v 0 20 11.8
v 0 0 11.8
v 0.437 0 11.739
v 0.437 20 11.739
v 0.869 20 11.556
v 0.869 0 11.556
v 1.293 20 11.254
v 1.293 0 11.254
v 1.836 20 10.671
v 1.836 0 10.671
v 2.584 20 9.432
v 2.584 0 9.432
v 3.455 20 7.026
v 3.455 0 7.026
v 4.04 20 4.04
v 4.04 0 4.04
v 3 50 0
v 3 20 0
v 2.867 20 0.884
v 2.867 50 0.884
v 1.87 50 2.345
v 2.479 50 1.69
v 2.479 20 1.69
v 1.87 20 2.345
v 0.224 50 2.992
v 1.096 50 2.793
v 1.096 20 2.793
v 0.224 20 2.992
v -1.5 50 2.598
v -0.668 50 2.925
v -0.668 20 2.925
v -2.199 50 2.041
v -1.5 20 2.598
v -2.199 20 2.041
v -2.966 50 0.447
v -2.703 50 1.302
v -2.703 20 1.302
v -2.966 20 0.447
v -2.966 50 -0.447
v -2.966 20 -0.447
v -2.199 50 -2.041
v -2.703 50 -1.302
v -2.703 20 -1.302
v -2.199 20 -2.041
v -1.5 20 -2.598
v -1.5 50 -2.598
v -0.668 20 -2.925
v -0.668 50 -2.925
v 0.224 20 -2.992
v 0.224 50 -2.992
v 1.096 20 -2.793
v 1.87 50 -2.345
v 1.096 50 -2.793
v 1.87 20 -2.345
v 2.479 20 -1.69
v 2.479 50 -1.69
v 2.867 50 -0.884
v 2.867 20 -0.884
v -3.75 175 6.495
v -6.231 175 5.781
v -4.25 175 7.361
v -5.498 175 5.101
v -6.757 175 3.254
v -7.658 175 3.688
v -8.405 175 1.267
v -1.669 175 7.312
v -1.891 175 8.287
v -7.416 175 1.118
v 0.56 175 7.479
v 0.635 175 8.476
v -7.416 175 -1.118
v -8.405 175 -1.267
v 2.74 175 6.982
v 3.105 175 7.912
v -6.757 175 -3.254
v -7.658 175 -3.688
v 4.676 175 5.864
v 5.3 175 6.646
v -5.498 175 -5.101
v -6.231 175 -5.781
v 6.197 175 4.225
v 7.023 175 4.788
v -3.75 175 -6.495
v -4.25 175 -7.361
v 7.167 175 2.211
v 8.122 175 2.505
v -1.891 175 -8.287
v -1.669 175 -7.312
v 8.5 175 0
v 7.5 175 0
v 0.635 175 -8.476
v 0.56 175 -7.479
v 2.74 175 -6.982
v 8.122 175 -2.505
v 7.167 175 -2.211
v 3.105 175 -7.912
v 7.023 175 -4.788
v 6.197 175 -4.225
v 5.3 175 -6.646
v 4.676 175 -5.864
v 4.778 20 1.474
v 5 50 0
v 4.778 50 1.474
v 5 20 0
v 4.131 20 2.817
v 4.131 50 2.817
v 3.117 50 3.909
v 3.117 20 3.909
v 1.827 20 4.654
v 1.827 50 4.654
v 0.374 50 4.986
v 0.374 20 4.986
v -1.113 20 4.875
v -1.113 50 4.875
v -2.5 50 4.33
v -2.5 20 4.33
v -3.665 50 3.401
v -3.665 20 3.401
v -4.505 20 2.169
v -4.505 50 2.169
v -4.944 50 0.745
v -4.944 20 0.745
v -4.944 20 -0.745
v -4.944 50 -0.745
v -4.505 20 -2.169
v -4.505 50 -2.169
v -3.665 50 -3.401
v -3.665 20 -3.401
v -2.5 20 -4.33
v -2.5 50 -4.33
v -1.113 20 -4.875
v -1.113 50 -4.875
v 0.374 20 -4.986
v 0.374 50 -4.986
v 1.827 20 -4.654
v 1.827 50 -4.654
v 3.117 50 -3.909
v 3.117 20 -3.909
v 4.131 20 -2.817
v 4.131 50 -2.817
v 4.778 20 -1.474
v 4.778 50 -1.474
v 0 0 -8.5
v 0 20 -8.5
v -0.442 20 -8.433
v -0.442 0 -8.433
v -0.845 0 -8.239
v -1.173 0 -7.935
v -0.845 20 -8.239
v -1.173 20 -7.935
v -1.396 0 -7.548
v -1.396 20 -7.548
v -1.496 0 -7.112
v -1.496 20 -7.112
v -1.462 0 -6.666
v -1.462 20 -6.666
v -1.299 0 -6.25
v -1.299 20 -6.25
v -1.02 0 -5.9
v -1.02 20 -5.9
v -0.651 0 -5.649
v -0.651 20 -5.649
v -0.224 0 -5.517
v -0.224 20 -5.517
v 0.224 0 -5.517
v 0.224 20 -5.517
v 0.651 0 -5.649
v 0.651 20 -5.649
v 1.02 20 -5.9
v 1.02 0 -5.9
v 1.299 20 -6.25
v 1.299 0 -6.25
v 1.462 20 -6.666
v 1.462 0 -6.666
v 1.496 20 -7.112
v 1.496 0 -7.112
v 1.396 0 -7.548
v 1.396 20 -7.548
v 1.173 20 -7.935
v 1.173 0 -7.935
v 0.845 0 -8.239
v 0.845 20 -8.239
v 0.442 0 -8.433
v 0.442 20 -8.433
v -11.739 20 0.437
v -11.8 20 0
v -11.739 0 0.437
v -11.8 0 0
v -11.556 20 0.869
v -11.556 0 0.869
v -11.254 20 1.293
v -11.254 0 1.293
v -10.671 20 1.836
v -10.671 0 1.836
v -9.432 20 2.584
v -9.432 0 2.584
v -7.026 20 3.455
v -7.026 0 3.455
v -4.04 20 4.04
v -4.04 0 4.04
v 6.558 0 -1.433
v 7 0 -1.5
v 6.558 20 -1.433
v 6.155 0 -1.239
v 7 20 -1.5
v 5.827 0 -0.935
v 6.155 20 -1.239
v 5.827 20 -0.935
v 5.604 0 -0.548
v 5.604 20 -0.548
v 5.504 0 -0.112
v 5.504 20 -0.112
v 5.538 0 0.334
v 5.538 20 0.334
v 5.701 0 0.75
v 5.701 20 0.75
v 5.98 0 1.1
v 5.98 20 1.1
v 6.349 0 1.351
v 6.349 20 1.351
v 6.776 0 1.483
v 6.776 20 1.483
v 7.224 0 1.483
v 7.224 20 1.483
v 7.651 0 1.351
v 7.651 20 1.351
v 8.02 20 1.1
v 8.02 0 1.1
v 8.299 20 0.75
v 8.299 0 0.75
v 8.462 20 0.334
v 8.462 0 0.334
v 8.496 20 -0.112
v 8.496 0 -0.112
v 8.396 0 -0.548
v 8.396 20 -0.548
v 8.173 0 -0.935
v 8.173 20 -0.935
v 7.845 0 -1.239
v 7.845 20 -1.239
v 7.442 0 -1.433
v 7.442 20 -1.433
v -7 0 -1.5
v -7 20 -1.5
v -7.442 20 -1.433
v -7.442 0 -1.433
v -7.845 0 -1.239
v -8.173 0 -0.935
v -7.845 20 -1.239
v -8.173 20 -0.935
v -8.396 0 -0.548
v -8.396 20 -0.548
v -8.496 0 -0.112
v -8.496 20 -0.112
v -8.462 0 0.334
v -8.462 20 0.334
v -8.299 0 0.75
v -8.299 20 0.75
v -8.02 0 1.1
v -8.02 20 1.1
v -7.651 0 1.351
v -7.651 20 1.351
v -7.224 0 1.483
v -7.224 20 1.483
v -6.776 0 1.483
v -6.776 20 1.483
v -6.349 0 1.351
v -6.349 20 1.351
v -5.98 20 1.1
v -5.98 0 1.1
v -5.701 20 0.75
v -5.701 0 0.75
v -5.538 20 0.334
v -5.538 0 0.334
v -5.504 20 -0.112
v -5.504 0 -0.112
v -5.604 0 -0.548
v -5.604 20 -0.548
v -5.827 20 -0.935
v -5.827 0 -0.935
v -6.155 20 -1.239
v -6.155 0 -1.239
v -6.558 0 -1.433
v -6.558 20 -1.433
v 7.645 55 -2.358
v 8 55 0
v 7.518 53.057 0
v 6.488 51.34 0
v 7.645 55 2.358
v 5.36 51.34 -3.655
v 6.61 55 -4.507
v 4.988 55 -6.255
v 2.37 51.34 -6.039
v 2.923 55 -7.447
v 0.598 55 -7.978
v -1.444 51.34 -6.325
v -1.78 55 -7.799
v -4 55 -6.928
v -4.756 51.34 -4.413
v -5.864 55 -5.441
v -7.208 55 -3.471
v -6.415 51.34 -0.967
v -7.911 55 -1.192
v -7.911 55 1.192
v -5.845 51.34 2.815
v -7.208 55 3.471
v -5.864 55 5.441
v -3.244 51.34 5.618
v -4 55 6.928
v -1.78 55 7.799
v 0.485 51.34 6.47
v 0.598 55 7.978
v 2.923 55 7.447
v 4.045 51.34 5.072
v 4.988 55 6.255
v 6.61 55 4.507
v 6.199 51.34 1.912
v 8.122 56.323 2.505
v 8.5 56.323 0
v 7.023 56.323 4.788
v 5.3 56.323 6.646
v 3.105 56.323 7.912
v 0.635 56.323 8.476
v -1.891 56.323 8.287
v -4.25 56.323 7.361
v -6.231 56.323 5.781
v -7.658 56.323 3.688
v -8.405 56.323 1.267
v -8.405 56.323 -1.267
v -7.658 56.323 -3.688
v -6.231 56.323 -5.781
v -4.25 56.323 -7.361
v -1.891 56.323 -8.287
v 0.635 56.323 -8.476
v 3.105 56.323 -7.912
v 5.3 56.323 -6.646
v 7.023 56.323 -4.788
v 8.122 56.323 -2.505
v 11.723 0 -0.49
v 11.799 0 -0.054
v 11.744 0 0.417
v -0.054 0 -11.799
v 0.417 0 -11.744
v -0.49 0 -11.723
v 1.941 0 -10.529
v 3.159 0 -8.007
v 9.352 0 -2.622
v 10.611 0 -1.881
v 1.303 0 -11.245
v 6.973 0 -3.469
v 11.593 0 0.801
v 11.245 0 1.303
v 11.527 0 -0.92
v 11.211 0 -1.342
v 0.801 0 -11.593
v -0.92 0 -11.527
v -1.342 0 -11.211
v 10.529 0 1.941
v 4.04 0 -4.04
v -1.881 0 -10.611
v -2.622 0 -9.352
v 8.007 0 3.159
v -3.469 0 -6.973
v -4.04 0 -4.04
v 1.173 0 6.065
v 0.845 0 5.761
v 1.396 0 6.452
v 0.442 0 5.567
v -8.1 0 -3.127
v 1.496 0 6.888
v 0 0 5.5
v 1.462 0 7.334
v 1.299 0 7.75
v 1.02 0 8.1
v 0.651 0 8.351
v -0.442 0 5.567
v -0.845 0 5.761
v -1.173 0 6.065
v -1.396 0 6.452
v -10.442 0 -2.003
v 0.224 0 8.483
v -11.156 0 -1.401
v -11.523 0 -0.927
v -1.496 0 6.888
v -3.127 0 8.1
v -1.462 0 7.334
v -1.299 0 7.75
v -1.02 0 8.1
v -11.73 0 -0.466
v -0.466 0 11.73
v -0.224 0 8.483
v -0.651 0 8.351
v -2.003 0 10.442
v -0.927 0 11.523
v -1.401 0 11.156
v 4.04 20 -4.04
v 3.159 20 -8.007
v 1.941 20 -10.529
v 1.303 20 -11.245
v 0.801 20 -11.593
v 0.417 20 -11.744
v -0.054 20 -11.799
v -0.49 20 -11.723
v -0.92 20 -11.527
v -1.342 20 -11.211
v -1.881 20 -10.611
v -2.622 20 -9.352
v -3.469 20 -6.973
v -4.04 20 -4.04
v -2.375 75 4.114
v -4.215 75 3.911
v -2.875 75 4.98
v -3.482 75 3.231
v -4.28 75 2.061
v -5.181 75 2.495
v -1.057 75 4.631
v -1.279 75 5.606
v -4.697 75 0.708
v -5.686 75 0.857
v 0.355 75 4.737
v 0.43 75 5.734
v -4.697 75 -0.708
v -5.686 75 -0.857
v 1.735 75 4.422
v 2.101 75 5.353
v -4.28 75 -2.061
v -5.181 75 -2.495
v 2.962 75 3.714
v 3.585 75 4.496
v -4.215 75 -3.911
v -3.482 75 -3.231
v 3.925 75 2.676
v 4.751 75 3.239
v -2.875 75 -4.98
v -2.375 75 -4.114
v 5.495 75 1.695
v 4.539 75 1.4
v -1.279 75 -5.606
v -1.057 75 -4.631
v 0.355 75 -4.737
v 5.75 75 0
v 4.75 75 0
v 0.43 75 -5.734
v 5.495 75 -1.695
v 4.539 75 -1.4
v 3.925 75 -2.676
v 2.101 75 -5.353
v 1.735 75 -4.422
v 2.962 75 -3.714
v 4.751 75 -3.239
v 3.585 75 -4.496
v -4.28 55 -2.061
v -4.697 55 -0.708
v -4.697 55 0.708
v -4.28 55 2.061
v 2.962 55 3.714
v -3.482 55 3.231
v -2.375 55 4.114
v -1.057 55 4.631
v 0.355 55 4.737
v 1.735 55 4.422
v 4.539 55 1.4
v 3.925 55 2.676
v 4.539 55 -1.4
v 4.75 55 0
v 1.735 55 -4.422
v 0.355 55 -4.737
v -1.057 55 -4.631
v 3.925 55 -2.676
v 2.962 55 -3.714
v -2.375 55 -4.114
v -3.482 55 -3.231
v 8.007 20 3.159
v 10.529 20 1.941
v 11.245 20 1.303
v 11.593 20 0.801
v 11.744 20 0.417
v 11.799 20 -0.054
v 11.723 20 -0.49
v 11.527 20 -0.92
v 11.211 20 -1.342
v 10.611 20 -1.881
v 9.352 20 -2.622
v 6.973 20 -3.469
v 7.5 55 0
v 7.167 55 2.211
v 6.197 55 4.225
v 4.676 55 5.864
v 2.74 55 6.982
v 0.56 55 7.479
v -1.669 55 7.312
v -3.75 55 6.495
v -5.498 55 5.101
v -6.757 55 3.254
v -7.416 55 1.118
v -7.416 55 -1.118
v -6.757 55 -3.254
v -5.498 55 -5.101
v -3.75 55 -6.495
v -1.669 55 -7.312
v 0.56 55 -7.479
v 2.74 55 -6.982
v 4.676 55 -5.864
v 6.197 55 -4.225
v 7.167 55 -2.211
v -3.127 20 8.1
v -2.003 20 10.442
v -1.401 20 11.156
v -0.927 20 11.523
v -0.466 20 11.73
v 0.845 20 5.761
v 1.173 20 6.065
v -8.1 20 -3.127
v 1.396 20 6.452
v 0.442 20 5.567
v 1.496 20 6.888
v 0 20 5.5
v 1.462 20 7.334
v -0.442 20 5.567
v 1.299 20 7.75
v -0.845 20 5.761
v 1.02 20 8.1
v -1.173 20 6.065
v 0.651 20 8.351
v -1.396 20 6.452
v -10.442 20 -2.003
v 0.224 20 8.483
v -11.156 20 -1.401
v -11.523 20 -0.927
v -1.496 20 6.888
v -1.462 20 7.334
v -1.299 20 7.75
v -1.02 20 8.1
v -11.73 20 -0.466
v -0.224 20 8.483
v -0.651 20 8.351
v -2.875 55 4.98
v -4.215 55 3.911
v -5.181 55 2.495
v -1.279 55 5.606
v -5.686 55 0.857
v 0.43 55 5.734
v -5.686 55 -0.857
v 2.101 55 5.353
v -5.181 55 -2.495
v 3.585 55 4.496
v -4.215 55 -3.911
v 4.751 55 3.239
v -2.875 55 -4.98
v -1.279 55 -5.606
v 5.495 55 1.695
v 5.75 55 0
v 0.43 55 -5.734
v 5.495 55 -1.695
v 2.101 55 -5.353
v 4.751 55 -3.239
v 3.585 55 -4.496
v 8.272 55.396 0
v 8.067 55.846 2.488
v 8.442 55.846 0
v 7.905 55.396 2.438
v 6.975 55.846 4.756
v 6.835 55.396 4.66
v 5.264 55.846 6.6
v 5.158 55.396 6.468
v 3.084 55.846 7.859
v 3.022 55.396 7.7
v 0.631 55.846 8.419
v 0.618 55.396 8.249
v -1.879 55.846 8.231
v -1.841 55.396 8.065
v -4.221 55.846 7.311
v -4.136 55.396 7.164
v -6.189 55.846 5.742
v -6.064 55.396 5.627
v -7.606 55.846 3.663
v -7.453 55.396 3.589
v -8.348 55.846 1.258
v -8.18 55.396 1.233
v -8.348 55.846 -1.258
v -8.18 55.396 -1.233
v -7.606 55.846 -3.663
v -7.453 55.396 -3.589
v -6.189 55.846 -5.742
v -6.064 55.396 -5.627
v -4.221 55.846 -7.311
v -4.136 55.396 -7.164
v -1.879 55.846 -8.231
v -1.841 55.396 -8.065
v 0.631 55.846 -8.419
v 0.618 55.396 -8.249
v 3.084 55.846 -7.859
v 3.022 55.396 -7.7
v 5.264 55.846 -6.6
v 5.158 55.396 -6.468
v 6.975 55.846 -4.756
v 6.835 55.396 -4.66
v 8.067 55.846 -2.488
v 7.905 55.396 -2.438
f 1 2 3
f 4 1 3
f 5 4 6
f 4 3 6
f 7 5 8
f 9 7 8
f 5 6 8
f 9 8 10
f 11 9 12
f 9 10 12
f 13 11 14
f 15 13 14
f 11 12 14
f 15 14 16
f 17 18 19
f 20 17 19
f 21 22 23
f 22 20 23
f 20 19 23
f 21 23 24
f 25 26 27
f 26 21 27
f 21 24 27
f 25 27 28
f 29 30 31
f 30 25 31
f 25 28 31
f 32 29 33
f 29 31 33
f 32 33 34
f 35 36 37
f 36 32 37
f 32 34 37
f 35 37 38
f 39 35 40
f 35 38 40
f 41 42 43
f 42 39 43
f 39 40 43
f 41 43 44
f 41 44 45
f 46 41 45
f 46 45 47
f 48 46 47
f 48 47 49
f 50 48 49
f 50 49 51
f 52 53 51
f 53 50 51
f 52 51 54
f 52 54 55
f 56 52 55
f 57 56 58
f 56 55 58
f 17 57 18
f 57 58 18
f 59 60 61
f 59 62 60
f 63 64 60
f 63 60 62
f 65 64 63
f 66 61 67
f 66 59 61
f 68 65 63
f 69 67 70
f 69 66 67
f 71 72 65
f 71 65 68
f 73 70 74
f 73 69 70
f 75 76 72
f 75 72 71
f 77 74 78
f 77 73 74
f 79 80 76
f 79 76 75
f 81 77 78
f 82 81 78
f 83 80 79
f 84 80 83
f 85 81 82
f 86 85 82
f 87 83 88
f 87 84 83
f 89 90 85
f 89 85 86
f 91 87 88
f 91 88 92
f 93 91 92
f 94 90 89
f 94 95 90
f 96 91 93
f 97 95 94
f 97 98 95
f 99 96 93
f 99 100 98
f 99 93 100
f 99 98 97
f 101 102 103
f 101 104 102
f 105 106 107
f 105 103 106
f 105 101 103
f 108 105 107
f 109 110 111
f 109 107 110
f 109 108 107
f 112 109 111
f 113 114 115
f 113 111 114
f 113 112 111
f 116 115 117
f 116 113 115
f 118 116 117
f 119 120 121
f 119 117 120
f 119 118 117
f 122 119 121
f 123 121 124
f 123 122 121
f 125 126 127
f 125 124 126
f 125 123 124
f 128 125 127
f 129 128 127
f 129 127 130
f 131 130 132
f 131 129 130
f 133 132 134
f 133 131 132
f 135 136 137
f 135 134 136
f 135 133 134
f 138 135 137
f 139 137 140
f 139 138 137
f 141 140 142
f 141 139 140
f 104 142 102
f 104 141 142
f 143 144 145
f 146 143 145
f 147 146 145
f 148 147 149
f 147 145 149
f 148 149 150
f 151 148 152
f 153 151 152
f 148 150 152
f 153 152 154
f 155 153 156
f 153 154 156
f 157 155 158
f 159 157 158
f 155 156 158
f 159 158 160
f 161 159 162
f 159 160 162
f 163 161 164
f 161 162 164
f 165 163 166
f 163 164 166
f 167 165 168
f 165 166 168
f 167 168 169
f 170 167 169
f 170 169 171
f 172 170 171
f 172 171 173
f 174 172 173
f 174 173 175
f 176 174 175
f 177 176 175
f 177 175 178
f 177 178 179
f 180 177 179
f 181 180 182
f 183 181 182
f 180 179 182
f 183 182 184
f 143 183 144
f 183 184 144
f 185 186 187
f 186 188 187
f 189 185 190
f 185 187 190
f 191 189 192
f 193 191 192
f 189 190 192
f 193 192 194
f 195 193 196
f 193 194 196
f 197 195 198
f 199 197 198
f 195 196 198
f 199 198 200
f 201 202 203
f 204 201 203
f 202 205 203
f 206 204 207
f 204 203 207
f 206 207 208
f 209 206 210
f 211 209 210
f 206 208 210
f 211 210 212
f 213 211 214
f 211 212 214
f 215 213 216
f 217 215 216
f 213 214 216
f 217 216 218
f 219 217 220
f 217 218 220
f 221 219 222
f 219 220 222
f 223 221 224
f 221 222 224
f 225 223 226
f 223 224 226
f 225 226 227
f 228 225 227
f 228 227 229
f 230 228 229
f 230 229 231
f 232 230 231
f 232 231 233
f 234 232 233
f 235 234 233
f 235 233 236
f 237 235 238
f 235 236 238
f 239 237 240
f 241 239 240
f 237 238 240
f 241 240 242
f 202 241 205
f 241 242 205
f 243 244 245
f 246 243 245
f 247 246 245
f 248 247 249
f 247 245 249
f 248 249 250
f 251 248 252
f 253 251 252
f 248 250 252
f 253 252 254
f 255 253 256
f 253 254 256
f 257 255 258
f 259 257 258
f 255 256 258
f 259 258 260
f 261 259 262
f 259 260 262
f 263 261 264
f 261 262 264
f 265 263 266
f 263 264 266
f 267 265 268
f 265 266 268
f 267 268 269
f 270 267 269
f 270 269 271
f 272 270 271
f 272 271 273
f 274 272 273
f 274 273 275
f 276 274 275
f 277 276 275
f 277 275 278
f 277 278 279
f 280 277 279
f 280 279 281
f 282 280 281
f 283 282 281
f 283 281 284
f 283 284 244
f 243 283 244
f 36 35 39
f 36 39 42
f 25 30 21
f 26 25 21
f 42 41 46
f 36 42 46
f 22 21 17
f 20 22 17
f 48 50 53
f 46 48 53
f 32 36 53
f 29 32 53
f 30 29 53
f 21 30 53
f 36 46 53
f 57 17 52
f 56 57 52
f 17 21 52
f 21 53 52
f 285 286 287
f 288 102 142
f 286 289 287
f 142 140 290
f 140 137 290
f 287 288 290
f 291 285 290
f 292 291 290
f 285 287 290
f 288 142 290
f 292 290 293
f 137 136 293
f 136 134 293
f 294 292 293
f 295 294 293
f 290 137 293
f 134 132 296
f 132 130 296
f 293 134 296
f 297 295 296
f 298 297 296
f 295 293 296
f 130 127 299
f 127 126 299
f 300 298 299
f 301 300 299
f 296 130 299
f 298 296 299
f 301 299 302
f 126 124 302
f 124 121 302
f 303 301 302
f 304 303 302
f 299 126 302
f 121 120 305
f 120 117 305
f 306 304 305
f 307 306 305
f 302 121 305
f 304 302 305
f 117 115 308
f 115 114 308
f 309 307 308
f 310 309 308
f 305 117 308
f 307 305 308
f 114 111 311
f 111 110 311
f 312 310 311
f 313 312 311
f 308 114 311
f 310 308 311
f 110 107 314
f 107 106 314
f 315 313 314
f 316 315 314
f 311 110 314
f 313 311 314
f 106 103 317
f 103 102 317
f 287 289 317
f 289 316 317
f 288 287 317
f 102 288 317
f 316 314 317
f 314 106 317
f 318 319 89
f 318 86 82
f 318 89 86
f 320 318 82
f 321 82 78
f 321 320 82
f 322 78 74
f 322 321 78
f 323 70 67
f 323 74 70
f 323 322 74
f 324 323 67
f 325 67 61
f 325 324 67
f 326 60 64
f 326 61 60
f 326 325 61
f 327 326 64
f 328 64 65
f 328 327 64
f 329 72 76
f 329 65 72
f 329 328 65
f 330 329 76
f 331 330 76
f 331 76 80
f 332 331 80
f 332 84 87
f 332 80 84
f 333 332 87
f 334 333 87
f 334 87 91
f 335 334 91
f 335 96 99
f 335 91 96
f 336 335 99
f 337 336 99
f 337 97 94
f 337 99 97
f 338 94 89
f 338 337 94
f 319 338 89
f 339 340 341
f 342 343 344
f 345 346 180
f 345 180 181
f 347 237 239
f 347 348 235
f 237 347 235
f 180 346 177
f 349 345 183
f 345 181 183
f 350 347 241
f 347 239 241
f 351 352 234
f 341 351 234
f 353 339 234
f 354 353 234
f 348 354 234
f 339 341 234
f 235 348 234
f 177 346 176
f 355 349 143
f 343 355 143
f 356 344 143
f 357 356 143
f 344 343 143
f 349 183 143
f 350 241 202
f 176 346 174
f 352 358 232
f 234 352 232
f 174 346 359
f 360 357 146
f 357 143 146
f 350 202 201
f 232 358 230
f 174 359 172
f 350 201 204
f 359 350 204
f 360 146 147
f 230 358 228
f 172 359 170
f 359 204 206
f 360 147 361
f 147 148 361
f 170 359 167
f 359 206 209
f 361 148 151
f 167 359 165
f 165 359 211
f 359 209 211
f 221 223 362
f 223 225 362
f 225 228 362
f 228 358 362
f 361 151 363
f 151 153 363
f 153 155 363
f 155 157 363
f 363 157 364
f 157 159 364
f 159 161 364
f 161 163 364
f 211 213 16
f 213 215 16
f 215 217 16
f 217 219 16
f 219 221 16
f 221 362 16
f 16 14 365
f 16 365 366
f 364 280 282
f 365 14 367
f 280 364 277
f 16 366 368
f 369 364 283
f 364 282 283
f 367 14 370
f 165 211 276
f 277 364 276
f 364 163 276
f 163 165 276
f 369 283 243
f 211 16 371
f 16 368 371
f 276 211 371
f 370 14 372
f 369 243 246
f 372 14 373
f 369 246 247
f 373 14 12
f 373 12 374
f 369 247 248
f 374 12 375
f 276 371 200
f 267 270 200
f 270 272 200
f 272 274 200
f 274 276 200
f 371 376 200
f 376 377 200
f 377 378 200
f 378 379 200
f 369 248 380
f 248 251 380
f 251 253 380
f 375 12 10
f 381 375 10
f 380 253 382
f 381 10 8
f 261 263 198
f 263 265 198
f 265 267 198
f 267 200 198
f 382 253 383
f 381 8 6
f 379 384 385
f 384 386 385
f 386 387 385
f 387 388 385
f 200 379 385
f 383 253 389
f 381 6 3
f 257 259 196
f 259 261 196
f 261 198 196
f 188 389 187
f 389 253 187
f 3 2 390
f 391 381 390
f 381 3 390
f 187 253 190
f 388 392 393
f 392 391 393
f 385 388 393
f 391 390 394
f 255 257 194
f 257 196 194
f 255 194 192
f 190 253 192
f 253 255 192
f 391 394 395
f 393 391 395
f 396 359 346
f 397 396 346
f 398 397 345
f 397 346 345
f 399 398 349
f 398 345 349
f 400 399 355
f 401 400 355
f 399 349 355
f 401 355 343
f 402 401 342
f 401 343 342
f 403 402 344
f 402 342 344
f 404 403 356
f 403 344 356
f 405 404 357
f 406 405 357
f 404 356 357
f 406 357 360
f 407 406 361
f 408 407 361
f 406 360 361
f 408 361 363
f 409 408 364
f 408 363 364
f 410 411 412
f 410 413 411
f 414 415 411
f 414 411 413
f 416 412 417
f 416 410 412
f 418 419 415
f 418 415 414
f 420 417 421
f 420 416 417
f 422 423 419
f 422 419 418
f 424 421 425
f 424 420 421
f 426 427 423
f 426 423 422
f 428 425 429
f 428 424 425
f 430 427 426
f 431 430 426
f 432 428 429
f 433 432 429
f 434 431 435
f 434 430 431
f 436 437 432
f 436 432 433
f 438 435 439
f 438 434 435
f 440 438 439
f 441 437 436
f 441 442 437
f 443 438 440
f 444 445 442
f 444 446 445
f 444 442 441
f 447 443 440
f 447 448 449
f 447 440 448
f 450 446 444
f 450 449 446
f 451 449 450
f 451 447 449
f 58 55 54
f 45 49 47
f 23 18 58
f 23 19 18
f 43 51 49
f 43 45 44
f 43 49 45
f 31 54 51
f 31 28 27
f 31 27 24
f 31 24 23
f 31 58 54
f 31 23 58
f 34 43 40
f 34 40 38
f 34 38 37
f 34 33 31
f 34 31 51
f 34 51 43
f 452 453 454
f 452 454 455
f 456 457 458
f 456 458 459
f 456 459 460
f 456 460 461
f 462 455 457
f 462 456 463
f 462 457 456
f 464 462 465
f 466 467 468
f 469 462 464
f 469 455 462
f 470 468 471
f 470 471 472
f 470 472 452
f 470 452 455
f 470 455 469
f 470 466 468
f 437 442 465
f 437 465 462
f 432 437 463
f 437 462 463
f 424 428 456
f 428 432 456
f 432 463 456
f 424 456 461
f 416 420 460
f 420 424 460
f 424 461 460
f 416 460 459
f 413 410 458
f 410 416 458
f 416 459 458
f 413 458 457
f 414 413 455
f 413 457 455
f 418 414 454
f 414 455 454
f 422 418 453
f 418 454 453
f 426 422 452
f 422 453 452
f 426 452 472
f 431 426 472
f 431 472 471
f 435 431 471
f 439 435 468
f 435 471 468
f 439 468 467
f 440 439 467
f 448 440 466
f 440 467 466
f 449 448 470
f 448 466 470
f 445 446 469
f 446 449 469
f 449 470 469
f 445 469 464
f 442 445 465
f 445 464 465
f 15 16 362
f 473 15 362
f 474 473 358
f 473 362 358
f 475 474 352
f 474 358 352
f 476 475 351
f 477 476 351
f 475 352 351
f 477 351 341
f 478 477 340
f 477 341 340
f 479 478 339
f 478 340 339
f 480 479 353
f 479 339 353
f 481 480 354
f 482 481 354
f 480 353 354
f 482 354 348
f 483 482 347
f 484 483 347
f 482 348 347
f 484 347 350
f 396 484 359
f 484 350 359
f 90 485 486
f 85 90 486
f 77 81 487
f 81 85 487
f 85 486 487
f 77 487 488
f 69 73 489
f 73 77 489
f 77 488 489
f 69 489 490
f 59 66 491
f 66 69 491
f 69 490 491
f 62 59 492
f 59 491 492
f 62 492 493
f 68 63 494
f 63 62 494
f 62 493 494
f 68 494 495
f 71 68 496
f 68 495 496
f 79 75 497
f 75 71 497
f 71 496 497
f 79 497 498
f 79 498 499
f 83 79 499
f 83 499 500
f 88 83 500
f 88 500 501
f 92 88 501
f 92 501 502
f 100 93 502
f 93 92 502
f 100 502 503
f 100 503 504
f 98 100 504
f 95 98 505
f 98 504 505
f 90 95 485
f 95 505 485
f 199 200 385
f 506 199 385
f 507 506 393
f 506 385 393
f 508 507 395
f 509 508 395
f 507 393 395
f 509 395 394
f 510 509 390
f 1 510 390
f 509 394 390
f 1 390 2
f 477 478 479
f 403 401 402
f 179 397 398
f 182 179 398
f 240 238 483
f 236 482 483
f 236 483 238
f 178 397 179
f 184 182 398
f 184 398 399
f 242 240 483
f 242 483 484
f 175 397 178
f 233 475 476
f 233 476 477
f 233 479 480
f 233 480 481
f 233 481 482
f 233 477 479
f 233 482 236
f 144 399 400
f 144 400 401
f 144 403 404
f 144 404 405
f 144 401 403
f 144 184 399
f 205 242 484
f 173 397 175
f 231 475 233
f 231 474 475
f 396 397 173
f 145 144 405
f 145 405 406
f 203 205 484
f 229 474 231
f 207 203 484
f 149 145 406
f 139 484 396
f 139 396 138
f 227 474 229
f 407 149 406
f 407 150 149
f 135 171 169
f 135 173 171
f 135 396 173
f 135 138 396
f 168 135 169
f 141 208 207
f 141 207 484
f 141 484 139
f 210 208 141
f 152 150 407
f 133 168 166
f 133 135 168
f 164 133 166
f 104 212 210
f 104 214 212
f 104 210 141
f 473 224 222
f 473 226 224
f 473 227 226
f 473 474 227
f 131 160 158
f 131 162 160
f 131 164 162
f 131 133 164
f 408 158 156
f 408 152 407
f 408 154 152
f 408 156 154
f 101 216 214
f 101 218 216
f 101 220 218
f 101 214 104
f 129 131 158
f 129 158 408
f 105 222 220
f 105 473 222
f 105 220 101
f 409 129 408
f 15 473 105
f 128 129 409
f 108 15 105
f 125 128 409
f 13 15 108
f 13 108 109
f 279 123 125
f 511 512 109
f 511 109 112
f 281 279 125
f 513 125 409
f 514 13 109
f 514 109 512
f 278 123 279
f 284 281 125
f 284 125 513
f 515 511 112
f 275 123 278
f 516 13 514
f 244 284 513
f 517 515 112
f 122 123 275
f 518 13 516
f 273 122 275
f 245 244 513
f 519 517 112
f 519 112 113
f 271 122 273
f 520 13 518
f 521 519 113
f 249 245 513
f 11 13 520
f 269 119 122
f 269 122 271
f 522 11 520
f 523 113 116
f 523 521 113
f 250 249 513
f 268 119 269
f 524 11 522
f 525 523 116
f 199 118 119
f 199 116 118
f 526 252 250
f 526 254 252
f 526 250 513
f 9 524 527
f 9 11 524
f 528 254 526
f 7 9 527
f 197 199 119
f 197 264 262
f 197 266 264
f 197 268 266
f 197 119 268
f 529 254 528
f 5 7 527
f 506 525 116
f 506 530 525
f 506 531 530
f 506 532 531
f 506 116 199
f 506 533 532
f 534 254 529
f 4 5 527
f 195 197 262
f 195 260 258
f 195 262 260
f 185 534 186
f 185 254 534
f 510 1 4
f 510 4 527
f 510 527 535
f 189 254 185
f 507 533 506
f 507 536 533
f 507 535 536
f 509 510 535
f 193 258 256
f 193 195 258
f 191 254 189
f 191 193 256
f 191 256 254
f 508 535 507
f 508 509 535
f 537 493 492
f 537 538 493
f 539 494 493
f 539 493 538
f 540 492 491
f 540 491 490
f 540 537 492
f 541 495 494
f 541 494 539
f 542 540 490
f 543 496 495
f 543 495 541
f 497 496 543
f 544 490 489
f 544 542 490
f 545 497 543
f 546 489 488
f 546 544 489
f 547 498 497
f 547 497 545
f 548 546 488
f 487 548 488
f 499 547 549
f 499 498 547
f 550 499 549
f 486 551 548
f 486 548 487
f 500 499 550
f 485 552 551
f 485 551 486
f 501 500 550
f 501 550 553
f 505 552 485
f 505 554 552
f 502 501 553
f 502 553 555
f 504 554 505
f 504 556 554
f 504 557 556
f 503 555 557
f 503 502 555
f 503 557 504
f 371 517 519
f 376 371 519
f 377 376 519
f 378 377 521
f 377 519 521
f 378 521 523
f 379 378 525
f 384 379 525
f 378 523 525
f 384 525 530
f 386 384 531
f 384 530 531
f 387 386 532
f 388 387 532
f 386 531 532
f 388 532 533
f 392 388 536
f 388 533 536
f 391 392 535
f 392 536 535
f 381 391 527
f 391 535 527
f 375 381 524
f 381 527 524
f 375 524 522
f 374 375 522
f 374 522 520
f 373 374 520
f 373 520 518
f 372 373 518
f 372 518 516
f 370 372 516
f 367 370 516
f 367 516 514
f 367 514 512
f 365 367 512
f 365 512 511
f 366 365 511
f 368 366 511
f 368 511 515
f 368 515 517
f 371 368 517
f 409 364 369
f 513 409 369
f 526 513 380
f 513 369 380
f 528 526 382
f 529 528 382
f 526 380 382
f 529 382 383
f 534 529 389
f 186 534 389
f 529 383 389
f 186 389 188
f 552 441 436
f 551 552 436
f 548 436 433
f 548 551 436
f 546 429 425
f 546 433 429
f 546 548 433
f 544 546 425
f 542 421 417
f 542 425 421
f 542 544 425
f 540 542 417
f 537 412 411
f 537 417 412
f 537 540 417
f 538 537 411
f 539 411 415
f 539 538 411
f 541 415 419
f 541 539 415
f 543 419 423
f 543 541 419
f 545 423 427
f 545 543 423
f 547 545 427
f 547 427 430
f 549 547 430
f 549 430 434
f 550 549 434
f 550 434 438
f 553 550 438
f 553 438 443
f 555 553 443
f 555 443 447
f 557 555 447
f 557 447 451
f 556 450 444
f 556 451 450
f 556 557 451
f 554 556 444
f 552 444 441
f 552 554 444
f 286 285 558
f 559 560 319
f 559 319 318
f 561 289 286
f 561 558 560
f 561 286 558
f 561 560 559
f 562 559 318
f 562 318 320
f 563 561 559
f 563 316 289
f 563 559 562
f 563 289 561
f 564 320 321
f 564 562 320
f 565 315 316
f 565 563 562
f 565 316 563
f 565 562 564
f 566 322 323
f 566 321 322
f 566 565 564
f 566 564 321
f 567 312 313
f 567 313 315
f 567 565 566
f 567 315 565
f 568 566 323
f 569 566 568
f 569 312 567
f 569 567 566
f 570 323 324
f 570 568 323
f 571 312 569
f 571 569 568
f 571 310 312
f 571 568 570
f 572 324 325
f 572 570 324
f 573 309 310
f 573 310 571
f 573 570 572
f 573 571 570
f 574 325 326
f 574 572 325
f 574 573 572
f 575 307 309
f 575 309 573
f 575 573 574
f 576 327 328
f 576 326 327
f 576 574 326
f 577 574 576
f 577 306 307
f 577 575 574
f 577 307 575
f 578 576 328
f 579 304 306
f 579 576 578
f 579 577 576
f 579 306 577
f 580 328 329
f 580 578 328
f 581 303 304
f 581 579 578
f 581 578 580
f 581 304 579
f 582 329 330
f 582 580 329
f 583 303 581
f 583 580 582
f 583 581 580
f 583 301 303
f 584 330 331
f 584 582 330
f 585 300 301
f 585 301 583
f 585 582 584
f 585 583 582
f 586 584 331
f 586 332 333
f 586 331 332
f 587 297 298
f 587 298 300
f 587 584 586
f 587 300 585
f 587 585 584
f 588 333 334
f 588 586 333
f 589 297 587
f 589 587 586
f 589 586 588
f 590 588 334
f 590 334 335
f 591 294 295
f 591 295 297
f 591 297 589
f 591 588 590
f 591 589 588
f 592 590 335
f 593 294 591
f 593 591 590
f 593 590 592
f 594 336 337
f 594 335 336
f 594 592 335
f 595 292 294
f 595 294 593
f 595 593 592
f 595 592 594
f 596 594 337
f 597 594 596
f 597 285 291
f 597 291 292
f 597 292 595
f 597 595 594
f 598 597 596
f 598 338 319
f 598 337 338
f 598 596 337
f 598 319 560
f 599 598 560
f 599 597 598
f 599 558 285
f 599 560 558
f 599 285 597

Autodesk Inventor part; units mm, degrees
ref_plane "YZ Plane" through (0, 0, 0) normal (1, 0, 0) x (0, 1, 0)
ref_plane "XZ Plane" through (0, 0, 0) normal (0, 1, 0) x (-1, 0, 0)
ref_plane "XY Plane" through (0, 0, 0) normal (0, 0, 1) x (1, 0, 0)
sketch "Sketch1" plane through (0, 0, 0) normal (0, 1, 0) x (-1, 0, 0)
  ellipse E0 centre (0, 0) end of major axis (0, 11.8) minor radius 4.3
  ellipse E1 centre (0, 0) end of major axis (11.8, 0) minor radius 4.3
  dimension "d0" = 11.8
  dimension "d1" = 4.3
  dimension "d2" = 11.8
  dimension "d3" = 4.3
sketch "Sketch2" plane through (0, 0, 0) normal (0, 1, 0) x (-1, 0, 0)
  circle A0 centre (7, 0) radius 1.5
  circle A1 centre (0, -7) radius 1.5
  circle A2 centre (-7, 0) radius 1.5
  circle A3 centre (0, 7) radius 1.5
  point P0 (0, 0)
  dimension "d4" = 3
  dimension "d5" = 3
  dimension "d6" = 3
  dimension "d7" = 3
  dimension "d8" = 7
  dimension "d9" = 7
  dimension "d10" = 7
  dimension "d11" = 7
extrude "Extrusion1" add sketch "Sketch1" along normal blind 20
hole "Hole1" at (7, 0, 0) at (0, 0, 7) at (0, 0, -7) at (-7, 0, 0) direction (0, 1, 0) diameter 3 depth 20 tip angle 118
sketch "Sketch5" plane through (0, 20, 0) normal (0, 1, 0) x (1, 0, 0)
  circle A0 centre (0, 0) radius 5
  circle A1 centre (0, 0) radius 3
  dimension "d25" = 10
  dimension "d26" = 6
extrude "Extrusion3" add sketch "Sketch5" along normal blind 30
sketch "Sketch6" plane through (0, 50, 0) normal (0, 1, 0) x (1, 0, 0)
  point P0 (0, 0)
sketch "Sketch7" plane through (0, 50, 0) normal (0, 1, 0) x (1, 0, 0)
  circle A0 centre (0, 0) radius 8
  dimension "d29" = 16
extrude "Extrusion4" add sketch "Sketch7" along normal blind 5
fillet "Fillet1" radius 6.7625 1 edges at (-8, 50, 0)
sketch "Sketch8" plane through (0, 55, 0) normal (0, 1, 0) x (1, 0, 0)
  circle A0 centre (0, 0) radius 8.5
  circle A1 centre (0, 0) radius 7.5
  dimension "d33" = 17
  dimension "d34" = 15
sketch "Sketch9" plane through (0, 55, 0) normal (0, 1, 0) x (1, 0, 0)
  circle A0 centre (0, 0) radius 5.75
  circle A1 centre (0, 0) radius 4.75
  dimension "d35" = 11.5
  dimension "d36" = 9.5
extrude "Extrusion5" add sketch "Sketch8" along normal blind 120
extrude "Extrusion6" add sketch "Sketch9" along normal blind 20
sketch "Sketch10" plane through (0, 75, 0) normal (0, 1, 0) x (1, 0, 0)
  point P0 (0, 0)
sketch "Sketch11" plane through (0, 75, 0) normal (0, 1, 0) x (1, 0, 0)
  point P0 (0, 0)
fillet "Fillet4" radius 2 1 edges at (-8.5, 55, 0)
properties part number "BB-8_headslider_stilt"
